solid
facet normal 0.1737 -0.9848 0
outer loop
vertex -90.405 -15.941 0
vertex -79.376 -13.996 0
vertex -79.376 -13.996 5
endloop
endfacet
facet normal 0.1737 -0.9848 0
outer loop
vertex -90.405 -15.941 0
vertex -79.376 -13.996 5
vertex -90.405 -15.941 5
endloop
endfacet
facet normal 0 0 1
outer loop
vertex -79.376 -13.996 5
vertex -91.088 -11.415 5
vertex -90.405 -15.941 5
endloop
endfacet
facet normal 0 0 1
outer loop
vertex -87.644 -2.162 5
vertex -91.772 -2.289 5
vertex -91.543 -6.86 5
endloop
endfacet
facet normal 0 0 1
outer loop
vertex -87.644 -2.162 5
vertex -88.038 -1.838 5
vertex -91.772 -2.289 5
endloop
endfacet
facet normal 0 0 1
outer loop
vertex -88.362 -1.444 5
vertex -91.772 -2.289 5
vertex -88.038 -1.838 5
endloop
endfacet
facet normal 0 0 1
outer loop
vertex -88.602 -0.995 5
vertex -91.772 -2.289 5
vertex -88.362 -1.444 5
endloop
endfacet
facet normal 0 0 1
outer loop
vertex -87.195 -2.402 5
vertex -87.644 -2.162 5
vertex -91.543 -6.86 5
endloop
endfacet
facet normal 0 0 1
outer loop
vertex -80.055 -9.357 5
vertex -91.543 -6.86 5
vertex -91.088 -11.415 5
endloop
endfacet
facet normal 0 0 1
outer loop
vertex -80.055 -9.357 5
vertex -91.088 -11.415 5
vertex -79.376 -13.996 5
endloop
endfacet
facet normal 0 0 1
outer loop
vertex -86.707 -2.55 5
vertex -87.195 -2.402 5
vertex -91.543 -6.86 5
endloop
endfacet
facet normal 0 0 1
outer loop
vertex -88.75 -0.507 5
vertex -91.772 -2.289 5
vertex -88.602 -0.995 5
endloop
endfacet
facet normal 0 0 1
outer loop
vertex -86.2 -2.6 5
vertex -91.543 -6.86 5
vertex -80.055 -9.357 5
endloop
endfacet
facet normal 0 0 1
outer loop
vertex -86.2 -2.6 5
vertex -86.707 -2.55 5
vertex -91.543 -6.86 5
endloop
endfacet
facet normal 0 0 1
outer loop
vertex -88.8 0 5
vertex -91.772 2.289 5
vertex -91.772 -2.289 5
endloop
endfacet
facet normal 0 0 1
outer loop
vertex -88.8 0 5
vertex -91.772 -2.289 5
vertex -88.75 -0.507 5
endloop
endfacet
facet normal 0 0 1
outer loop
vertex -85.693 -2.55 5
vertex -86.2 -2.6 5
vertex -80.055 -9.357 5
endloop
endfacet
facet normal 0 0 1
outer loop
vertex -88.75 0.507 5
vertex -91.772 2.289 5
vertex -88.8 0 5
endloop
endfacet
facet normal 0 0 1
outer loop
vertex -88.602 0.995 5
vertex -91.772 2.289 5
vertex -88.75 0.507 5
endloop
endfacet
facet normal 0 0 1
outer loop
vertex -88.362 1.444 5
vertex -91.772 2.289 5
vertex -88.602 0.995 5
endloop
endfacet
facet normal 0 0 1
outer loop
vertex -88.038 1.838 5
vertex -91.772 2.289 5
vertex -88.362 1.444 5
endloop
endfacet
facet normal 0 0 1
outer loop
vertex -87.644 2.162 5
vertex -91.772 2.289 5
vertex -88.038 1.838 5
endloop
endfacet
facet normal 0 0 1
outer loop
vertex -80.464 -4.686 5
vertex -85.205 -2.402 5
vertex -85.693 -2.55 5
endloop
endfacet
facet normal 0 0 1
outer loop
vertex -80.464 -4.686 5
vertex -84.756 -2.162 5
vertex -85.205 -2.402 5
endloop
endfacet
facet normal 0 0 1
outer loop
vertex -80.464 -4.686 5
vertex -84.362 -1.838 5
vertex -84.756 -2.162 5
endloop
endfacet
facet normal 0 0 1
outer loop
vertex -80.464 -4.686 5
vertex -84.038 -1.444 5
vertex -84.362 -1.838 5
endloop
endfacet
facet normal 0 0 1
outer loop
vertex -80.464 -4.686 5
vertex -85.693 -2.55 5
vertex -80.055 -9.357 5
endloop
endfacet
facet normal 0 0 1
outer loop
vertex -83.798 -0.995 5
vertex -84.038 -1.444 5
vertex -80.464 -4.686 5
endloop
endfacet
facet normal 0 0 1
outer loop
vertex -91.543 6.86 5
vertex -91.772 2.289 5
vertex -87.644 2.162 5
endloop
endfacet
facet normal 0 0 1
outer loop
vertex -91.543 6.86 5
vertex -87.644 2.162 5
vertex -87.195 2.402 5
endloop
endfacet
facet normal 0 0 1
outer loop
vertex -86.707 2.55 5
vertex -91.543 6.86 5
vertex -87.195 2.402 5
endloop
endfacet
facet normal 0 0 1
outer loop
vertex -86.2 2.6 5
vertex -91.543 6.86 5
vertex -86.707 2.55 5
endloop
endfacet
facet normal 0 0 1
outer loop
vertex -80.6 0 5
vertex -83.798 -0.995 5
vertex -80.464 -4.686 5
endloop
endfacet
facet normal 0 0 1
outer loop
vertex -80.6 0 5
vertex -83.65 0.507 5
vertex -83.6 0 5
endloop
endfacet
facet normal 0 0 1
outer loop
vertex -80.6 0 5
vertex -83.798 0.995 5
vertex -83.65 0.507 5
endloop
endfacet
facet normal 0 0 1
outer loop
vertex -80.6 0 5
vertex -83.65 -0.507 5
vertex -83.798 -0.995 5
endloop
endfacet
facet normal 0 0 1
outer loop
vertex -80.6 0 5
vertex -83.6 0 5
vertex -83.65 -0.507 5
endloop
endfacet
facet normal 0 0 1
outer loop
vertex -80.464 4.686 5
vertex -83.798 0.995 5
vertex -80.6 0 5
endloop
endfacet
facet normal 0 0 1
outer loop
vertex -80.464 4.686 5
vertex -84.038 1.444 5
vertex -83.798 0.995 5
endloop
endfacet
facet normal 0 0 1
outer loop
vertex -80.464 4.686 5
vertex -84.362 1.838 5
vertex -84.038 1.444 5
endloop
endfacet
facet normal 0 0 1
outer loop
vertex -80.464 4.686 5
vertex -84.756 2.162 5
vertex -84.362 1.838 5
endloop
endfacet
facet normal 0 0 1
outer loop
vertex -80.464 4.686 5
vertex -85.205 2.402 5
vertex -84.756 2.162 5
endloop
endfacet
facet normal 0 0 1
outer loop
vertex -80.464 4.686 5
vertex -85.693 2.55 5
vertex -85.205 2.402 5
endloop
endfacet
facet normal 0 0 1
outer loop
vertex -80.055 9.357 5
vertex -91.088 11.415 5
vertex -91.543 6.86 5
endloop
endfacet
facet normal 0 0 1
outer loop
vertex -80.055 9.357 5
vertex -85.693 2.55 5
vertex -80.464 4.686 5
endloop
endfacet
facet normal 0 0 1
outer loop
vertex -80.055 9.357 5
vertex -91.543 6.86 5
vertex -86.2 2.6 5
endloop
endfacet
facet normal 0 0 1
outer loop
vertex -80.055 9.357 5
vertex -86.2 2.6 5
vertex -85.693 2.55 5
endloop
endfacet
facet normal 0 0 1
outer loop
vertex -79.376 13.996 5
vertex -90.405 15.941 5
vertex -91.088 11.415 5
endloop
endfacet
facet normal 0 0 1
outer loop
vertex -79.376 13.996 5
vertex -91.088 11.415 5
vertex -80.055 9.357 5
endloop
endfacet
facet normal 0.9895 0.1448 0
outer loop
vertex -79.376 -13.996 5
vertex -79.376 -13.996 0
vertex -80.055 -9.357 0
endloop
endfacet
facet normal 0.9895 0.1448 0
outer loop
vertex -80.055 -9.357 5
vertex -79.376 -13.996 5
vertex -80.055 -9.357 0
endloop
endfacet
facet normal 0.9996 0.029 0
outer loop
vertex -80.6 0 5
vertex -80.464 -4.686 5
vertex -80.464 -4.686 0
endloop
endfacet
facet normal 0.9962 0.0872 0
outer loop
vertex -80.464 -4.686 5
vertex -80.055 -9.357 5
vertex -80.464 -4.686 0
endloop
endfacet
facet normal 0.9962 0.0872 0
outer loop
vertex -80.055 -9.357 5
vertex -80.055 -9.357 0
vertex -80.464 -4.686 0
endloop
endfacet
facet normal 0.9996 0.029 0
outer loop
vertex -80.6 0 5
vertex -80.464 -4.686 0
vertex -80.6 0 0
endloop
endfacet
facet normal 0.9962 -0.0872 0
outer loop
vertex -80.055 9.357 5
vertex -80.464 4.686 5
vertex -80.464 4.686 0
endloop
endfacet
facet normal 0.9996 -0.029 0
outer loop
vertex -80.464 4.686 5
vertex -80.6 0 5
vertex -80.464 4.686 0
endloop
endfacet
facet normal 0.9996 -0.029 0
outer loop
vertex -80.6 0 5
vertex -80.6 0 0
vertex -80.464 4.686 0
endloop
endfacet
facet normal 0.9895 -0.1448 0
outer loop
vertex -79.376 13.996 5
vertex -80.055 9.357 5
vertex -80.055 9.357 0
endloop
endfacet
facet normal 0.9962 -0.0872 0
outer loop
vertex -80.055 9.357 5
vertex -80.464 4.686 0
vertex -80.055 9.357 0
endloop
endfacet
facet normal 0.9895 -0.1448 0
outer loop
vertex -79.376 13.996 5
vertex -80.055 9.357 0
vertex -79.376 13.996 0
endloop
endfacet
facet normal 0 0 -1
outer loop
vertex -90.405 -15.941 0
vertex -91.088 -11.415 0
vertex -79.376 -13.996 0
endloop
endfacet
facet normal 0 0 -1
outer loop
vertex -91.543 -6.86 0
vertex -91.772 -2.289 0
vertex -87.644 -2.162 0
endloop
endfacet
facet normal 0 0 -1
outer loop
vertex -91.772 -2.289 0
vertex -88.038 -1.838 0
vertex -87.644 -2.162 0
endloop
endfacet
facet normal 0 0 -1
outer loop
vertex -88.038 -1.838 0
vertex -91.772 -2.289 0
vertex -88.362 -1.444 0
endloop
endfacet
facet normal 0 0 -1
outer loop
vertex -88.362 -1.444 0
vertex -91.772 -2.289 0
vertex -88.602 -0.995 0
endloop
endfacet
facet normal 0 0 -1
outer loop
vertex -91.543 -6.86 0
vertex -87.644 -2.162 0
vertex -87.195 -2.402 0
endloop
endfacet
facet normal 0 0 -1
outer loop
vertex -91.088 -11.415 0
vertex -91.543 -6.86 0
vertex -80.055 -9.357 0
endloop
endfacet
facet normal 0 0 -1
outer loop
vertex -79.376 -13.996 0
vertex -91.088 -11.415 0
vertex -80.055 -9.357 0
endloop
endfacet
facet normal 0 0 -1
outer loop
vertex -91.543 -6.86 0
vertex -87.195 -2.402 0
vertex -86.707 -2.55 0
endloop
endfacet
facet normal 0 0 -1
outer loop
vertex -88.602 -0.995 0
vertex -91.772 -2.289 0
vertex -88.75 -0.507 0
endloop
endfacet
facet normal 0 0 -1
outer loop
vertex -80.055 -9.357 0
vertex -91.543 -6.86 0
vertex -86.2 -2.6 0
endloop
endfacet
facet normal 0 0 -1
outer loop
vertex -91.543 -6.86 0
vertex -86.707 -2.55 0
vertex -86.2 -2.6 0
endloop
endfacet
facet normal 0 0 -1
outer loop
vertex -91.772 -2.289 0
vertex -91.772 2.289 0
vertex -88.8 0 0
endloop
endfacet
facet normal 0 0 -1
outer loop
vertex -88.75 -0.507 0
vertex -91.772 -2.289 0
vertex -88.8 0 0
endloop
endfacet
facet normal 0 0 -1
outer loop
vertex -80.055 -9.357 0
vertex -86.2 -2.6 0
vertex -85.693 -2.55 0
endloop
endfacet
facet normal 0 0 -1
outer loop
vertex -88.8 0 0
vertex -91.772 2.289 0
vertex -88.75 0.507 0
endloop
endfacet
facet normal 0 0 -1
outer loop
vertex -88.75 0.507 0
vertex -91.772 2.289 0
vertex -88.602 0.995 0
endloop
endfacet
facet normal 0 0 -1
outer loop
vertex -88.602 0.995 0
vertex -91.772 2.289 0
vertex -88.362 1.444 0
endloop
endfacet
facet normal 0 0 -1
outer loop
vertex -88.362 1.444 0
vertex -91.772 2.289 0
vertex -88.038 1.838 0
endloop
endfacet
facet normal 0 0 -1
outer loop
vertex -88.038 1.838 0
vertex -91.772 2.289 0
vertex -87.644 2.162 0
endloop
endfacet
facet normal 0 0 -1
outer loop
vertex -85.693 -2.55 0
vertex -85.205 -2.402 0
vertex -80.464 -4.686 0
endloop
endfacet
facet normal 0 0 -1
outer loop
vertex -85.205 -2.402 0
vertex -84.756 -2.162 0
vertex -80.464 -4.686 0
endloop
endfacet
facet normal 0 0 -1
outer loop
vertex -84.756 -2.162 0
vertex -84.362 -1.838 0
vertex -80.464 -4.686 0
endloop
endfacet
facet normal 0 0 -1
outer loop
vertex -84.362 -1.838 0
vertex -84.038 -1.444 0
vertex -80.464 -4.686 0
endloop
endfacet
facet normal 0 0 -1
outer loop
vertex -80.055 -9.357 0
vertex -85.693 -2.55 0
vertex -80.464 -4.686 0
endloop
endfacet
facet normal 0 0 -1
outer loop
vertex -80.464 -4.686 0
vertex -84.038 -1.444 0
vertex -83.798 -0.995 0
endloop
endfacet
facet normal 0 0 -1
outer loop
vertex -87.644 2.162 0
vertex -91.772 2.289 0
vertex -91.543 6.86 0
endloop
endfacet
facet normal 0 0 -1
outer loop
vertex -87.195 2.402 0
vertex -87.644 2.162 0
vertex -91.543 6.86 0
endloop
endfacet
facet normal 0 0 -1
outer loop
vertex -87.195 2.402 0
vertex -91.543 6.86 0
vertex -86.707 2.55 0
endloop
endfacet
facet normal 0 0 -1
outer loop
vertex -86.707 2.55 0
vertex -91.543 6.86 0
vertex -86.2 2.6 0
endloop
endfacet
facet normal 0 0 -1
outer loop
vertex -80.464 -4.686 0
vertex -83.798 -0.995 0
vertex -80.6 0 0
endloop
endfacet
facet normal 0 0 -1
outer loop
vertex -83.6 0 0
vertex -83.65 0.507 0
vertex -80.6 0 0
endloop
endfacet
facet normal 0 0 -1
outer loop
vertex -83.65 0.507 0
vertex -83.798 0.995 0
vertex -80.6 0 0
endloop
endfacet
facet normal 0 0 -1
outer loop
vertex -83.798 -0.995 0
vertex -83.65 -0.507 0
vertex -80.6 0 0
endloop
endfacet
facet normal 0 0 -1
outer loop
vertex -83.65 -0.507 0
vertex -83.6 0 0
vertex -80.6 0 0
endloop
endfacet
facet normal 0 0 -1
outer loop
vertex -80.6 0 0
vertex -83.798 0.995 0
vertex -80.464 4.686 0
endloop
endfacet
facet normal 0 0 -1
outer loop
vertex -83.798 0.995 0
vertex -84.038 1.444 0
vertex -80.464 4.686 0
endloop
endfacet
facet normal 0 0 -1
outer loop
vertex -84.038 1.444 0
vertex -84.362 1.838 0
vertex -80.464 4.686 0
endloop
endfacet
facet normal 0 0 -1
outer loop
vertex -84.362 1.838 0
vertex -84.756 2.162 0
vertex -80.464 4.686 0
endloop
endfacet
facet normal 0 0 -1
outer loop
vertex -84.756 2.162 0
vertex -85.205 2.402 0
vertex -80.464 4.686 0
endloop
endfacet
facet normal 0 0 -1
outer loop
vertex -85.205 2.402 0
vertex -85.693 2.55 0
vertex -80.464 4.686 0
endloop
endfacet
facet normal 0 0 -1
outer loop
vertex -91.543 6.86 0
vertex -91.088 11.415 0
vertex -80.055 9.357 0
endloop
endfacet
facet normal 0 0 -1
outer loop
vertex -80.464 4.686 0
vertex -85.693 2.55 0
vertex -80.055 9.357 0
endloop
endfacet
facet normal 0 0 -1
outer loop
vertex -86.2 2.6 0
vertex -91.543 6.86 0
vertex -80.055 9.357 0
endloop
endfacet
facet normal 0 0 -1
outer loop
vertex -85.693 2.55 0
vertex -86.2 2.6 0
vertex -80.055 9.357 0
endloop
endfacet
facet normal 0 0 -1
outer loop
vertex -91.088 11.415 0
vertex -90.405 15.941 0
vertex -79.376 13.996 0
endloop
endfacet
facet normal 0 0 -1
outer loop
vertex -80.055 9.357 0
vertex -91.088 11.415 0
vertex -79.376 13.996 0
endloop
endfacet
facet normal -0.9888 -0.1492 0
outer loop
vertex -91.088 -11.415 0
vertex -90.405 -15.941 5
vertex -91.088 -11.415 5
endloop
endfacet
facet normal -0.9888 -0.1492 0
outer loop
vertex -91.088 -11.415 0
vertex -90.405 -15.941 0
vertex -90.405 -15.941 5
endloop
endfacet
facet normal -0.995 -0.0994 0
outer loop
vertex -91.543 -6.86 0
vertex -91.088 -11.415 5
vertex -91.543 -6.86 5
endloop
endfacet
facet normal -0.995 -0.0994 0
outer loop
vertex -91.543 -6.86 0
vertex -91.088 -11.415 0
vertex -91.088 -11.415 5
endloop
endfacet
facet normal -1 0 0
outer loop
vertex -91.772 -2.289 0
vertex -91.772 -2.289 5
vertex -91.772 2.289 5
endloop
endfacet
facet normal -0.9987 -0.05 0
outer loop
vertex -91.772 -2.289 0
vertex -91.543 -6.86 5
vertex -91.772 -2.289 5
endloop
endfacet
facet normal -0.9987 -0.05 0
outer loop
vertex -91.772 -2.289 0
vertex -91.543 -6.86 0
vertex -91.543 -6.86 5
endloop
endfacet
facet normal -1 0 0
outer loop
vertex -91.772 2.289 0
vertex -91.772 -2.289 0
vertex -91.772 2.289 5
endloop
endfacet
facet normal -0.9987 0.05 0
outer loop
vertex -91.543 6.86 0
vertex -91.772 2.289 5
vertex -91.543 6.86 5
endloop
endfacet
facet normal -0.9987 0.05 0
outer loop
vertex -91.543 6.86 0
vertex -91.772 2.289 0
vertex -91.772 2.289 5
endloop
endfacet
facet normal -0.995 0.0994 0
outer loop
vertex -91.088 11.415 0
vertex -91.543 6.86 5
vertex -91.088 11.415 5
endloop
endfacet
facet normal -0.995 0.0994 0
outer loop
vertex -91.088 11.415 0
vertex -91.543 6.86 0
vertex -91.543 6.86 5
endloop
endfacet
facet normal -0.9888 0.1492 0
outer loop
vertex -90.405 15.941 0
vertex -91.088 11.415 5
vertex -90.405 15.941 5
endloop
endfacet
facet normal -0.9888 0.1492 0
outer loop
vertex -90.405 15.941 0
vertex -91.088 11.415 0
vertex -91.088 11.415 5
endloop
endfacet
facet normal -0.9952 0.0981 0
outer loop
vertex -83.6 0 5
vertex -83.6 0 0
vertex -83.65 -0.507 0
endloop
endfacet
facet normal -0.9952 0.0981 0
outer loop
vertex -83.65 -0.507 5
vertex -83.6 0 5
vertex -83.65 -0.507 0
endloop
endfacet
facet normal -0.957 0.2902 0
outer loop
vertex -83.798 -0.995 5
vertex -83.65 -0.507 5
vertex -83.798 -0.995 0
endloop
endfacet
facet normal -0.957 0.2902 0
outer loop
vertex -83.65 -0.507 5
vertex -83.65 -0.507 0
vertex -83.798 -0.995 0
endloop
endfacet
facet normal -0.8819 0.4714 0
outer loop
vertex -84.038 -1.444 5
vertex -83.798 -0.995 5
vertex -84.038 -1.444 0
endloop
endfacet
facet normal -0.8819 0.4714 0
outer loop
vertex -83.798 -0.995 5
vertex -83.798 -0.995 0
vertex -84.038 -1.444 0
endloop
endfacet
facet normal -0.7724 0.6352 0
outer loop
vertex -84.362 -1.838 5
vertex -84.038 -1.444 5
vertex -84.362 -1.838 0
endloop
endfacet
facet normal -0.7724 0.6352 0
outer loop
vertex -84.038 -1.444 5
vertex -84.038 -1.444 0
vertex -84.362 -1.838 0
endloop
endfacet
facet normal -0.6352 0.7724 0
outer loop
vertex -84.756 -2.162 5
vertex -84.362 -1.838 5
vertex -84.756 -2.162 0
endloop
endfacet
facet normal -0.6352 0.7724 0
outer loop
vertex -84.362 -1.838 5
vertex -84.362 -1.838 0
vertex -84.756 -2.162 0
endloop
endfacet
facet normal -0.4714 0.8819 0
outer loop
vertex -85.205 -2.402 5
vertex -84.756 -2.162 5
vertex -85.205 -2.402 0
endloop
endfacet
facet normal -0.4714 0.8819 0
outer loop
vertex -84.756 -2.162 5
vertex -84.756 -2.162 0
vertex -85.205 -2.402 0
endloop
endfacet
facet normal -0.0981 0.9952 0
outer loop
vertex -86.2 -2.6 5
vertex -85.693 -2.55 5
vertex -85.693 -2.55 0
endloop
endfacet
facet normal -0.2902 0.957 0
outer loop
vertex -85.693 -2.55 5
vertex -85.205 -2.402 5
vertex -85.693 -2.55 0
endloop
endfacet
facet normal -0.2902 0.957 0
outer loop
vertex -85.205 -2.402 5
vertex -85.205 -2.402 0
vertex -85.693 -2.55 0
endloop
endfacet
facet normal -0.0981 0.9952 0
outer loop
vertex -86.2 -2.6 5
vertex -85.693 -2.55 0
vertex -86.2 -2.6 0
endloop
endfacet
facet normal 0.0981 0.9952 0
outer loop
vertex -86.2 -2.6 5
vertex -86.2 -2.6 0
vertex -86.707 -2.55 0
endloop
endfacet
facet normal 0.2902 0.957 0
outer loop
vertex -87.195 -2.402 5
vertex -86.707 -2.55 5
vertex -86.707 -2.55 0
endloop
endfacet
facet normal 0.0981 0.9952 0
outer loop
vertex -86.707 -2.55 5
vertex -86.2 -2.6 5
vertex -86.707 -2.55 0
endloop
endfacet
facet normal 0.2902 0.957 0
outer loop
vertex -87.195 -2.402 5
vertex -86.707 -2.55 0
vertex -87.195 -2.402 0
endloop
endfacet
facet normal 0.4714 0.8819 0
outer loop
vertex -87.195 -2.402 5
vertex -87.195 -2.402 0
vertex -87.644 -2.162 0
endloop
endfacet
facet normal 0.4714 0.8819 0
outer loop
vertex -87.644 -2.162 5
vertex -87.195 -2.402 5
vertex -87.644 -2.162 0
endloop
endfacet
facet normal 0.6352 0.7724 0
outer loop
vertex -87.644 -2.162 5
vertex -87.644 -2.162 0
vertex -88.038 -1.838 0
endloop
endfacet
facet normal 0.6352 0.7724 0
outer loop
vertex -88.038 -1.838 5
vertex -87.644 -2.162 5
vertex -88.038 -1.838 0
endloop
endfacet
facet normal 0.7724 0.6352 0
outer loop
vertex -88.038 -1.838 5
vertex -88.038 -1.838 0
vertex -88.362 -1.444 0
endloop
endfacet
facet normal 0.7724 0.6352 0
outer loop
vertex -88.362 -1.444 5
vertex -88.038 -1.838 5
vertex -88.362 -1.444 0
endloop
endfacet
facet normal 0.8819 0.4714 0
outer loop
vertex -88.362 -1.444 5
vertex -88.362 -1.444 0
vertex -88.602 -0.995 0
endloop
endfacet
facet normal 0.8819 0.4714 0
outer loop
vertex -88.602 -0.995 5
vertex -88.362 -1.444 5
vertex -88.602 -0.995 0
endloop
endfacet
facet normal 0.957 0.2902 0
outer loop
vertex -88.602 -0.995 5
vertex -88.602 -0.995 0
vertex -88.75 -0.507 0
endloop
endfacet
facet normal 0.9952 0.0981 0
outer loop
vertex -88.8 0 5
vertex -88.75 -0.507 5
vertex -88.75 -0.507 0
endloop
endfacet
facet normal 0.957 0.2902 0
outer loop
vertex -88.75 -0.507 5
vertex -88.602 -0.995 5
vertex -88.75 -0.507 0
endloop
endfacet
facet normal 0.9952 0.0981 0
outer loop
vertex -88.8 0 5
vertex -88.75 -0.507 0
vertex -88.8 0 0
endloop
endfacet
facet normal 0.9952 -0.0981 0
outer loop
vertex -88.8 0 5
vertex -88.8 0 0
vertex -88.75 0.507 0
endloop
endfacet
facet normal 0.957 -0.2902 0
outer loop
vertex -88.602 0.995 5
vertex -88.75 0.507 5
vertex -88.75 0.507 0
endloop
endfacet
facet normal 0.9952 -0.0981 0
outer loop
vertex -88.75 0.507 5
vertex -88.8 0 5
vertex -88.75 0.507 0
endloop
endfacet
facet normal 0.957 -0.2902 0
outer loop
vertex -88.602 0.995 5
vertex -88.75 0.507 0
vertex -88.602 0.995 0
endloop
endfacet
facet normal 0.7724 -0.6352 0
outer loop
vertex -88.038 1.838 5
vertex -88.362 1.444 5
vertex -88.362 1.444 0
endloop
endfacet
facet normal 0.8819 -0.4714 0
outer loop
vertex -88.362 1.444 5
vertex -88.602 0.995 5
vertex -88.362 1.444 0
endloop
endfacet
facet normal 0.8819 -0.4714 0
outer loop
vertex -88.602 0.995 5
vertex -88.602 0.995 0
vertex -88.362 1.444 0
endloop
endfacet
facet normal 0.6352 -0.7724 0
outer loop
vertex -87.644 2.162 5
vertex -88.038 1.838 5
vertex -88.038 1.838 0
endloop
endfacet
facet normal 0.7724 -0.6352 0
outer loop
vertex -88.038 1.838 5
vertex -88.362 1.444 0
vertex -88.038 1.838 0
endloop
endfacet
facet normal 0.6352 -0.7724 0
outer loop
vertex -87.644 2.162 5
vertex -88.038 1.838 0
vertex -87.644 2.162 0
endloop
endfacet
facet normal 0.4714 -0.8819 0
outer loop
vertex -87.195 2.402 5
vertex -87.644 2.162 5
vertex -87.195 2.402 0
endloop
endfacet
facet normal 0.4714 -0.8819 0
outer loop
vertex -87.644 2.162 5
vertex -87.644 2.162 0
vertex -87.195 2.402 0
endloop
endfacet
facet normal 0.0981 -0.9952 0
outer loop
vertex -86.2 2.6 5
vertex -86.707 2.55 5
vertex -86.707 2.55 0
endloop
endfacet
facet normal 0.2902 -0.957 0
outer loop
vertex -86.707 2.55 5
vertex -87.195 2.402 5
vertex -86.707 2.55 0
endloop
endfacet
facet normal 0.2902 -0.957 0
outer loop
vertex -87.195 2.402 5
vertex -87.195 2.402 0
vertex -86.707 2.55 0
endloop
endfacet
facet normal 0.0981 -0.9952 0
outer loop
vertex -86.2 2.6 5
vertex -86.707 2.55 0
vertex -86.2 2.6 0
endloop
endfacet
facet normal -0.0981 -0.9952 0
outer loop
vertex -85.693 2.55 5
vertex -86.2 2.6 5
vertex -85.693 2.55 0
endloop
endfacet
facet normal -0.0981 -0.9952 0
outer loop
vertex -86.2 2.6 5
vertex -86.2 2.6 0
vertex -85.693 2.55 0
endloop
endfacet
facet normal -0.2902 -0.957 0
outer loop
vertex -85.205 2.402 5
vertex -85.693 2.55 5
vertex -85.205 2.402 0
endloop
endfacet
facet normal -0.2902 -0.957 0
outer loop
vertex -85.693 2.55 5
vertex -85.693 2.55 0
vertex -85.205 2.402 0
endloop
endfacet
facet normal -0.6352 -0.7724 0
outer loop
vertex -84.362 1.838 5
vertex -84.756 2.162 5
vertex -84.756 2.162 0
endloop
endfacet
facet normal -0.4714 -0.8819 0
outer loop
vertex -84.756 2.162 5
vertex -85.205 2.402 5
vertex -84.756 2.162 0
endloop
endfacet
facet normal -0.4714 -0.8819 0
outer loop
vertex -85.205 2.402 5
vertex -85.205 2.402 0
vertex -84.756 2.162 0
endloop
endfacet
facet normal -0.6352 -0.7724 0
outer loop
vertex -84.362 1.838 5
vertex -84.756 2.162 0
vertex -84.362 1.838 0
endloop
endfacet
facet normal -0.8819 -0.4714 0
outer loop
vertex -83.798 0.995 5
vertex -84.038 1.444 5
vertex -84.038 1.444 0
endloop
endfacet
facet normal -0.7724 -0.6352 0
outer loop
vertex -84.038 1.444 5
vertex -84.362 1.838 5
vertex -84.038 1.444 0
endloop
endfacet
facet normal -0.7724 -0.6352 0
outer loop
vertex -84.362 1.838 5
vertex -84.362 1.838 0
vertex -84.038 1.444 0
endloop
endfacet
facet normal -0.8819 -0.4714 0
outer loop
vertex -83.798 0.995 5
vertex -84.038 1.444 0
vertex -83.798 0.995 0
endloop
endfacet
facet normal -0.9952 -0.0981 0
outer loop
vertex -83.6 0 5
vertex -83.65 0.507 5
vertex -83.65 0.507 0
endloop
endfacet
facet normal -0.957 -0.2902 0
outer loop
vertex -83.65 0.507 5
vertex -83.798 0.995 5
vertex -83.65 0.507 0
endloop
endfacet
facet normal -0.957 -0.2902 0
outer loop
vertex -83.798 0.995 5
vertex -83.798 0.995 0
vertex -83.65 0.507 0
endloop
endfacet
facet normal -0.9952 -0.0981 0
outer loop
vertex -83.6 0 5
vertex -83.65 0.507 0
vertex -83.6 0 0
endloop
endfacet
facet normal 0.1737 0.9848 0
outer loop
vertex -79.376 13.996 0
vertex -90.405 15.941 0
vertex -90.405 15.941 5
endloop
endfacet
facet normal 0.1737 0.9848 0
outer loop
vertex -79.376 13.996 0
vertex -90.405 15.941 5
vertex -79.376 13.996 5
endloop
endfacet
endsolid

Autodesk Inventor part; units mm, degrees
ref_plane "YZ Plane" through (0, 0, 0) normal (1, 0, 0) x (0, 1, 0)
ref_plane "XZ Plane" through (0, 0, 0) normal (0, 1, 0) x (-1, 0, 0)
ref_plane "XY Plane" through (0, 0, 0) normal (0, 0, 1) x (1, 0, 0)
ref_plane "Arbeitsebene1" through (0, 0, 0) normal (0, 0, 1) x (1, 0, 0)
sketch "Skizze1" plane through (0, 0, 0) normal (0, 0, 1) x (1, 0, 0)
  circle A0 centre (86.2, 0) radius 2.6 construction
  circle A1 centre (-86.2, 0) radius 2.6 construction
  circle A2 centre (0, 0) radius 91.8 construction
  arc A3 (5.5, 85.9242) -> (-5.5, 85.9242) centre (0, 0) ccw construction
  line L0 (5.5, 85.9242) -> (5.5, 80.4121) construction
  arc A4 (-5.5, 80.4121) -> (5.5, 80.4121) centre (0, 0) ccw construction
  line L1 (-5.5, 80.4121) -> (-5.5, 85.9242) construction
  arc A5 (-90.4054, 15.9409) -> (-90.4054, -15.9409) centre (0, 0) ccw
  arc A6 (-79.3755, 13.996) -> (-79.3755, -13.996) centre (0, 0) ccw
  line L2 (-90.4054, 15.9409) -> (0, 0) construction
  line L3 (0, 0) -> (-90.4054, -15.9409) construction
  line L4 (-90.4054, 15.9409) -> (-79.3755, 13.996)
  line L5 (-79.3755, -13.996) -> (-90.4054, -15.9409)
  line L6 (0, 0) -> (-86.2, 0) construction
  circle A7 centre (-86.2, 0) radius 2.6
  dimension "d0" = 10
  dimension "d1" = 10
extrude "Extrusion1" add sketch "Skizze1" along normal blind 5
properties part number "Montage_Ring_Vorne_Aufdickung_Gewinde"
